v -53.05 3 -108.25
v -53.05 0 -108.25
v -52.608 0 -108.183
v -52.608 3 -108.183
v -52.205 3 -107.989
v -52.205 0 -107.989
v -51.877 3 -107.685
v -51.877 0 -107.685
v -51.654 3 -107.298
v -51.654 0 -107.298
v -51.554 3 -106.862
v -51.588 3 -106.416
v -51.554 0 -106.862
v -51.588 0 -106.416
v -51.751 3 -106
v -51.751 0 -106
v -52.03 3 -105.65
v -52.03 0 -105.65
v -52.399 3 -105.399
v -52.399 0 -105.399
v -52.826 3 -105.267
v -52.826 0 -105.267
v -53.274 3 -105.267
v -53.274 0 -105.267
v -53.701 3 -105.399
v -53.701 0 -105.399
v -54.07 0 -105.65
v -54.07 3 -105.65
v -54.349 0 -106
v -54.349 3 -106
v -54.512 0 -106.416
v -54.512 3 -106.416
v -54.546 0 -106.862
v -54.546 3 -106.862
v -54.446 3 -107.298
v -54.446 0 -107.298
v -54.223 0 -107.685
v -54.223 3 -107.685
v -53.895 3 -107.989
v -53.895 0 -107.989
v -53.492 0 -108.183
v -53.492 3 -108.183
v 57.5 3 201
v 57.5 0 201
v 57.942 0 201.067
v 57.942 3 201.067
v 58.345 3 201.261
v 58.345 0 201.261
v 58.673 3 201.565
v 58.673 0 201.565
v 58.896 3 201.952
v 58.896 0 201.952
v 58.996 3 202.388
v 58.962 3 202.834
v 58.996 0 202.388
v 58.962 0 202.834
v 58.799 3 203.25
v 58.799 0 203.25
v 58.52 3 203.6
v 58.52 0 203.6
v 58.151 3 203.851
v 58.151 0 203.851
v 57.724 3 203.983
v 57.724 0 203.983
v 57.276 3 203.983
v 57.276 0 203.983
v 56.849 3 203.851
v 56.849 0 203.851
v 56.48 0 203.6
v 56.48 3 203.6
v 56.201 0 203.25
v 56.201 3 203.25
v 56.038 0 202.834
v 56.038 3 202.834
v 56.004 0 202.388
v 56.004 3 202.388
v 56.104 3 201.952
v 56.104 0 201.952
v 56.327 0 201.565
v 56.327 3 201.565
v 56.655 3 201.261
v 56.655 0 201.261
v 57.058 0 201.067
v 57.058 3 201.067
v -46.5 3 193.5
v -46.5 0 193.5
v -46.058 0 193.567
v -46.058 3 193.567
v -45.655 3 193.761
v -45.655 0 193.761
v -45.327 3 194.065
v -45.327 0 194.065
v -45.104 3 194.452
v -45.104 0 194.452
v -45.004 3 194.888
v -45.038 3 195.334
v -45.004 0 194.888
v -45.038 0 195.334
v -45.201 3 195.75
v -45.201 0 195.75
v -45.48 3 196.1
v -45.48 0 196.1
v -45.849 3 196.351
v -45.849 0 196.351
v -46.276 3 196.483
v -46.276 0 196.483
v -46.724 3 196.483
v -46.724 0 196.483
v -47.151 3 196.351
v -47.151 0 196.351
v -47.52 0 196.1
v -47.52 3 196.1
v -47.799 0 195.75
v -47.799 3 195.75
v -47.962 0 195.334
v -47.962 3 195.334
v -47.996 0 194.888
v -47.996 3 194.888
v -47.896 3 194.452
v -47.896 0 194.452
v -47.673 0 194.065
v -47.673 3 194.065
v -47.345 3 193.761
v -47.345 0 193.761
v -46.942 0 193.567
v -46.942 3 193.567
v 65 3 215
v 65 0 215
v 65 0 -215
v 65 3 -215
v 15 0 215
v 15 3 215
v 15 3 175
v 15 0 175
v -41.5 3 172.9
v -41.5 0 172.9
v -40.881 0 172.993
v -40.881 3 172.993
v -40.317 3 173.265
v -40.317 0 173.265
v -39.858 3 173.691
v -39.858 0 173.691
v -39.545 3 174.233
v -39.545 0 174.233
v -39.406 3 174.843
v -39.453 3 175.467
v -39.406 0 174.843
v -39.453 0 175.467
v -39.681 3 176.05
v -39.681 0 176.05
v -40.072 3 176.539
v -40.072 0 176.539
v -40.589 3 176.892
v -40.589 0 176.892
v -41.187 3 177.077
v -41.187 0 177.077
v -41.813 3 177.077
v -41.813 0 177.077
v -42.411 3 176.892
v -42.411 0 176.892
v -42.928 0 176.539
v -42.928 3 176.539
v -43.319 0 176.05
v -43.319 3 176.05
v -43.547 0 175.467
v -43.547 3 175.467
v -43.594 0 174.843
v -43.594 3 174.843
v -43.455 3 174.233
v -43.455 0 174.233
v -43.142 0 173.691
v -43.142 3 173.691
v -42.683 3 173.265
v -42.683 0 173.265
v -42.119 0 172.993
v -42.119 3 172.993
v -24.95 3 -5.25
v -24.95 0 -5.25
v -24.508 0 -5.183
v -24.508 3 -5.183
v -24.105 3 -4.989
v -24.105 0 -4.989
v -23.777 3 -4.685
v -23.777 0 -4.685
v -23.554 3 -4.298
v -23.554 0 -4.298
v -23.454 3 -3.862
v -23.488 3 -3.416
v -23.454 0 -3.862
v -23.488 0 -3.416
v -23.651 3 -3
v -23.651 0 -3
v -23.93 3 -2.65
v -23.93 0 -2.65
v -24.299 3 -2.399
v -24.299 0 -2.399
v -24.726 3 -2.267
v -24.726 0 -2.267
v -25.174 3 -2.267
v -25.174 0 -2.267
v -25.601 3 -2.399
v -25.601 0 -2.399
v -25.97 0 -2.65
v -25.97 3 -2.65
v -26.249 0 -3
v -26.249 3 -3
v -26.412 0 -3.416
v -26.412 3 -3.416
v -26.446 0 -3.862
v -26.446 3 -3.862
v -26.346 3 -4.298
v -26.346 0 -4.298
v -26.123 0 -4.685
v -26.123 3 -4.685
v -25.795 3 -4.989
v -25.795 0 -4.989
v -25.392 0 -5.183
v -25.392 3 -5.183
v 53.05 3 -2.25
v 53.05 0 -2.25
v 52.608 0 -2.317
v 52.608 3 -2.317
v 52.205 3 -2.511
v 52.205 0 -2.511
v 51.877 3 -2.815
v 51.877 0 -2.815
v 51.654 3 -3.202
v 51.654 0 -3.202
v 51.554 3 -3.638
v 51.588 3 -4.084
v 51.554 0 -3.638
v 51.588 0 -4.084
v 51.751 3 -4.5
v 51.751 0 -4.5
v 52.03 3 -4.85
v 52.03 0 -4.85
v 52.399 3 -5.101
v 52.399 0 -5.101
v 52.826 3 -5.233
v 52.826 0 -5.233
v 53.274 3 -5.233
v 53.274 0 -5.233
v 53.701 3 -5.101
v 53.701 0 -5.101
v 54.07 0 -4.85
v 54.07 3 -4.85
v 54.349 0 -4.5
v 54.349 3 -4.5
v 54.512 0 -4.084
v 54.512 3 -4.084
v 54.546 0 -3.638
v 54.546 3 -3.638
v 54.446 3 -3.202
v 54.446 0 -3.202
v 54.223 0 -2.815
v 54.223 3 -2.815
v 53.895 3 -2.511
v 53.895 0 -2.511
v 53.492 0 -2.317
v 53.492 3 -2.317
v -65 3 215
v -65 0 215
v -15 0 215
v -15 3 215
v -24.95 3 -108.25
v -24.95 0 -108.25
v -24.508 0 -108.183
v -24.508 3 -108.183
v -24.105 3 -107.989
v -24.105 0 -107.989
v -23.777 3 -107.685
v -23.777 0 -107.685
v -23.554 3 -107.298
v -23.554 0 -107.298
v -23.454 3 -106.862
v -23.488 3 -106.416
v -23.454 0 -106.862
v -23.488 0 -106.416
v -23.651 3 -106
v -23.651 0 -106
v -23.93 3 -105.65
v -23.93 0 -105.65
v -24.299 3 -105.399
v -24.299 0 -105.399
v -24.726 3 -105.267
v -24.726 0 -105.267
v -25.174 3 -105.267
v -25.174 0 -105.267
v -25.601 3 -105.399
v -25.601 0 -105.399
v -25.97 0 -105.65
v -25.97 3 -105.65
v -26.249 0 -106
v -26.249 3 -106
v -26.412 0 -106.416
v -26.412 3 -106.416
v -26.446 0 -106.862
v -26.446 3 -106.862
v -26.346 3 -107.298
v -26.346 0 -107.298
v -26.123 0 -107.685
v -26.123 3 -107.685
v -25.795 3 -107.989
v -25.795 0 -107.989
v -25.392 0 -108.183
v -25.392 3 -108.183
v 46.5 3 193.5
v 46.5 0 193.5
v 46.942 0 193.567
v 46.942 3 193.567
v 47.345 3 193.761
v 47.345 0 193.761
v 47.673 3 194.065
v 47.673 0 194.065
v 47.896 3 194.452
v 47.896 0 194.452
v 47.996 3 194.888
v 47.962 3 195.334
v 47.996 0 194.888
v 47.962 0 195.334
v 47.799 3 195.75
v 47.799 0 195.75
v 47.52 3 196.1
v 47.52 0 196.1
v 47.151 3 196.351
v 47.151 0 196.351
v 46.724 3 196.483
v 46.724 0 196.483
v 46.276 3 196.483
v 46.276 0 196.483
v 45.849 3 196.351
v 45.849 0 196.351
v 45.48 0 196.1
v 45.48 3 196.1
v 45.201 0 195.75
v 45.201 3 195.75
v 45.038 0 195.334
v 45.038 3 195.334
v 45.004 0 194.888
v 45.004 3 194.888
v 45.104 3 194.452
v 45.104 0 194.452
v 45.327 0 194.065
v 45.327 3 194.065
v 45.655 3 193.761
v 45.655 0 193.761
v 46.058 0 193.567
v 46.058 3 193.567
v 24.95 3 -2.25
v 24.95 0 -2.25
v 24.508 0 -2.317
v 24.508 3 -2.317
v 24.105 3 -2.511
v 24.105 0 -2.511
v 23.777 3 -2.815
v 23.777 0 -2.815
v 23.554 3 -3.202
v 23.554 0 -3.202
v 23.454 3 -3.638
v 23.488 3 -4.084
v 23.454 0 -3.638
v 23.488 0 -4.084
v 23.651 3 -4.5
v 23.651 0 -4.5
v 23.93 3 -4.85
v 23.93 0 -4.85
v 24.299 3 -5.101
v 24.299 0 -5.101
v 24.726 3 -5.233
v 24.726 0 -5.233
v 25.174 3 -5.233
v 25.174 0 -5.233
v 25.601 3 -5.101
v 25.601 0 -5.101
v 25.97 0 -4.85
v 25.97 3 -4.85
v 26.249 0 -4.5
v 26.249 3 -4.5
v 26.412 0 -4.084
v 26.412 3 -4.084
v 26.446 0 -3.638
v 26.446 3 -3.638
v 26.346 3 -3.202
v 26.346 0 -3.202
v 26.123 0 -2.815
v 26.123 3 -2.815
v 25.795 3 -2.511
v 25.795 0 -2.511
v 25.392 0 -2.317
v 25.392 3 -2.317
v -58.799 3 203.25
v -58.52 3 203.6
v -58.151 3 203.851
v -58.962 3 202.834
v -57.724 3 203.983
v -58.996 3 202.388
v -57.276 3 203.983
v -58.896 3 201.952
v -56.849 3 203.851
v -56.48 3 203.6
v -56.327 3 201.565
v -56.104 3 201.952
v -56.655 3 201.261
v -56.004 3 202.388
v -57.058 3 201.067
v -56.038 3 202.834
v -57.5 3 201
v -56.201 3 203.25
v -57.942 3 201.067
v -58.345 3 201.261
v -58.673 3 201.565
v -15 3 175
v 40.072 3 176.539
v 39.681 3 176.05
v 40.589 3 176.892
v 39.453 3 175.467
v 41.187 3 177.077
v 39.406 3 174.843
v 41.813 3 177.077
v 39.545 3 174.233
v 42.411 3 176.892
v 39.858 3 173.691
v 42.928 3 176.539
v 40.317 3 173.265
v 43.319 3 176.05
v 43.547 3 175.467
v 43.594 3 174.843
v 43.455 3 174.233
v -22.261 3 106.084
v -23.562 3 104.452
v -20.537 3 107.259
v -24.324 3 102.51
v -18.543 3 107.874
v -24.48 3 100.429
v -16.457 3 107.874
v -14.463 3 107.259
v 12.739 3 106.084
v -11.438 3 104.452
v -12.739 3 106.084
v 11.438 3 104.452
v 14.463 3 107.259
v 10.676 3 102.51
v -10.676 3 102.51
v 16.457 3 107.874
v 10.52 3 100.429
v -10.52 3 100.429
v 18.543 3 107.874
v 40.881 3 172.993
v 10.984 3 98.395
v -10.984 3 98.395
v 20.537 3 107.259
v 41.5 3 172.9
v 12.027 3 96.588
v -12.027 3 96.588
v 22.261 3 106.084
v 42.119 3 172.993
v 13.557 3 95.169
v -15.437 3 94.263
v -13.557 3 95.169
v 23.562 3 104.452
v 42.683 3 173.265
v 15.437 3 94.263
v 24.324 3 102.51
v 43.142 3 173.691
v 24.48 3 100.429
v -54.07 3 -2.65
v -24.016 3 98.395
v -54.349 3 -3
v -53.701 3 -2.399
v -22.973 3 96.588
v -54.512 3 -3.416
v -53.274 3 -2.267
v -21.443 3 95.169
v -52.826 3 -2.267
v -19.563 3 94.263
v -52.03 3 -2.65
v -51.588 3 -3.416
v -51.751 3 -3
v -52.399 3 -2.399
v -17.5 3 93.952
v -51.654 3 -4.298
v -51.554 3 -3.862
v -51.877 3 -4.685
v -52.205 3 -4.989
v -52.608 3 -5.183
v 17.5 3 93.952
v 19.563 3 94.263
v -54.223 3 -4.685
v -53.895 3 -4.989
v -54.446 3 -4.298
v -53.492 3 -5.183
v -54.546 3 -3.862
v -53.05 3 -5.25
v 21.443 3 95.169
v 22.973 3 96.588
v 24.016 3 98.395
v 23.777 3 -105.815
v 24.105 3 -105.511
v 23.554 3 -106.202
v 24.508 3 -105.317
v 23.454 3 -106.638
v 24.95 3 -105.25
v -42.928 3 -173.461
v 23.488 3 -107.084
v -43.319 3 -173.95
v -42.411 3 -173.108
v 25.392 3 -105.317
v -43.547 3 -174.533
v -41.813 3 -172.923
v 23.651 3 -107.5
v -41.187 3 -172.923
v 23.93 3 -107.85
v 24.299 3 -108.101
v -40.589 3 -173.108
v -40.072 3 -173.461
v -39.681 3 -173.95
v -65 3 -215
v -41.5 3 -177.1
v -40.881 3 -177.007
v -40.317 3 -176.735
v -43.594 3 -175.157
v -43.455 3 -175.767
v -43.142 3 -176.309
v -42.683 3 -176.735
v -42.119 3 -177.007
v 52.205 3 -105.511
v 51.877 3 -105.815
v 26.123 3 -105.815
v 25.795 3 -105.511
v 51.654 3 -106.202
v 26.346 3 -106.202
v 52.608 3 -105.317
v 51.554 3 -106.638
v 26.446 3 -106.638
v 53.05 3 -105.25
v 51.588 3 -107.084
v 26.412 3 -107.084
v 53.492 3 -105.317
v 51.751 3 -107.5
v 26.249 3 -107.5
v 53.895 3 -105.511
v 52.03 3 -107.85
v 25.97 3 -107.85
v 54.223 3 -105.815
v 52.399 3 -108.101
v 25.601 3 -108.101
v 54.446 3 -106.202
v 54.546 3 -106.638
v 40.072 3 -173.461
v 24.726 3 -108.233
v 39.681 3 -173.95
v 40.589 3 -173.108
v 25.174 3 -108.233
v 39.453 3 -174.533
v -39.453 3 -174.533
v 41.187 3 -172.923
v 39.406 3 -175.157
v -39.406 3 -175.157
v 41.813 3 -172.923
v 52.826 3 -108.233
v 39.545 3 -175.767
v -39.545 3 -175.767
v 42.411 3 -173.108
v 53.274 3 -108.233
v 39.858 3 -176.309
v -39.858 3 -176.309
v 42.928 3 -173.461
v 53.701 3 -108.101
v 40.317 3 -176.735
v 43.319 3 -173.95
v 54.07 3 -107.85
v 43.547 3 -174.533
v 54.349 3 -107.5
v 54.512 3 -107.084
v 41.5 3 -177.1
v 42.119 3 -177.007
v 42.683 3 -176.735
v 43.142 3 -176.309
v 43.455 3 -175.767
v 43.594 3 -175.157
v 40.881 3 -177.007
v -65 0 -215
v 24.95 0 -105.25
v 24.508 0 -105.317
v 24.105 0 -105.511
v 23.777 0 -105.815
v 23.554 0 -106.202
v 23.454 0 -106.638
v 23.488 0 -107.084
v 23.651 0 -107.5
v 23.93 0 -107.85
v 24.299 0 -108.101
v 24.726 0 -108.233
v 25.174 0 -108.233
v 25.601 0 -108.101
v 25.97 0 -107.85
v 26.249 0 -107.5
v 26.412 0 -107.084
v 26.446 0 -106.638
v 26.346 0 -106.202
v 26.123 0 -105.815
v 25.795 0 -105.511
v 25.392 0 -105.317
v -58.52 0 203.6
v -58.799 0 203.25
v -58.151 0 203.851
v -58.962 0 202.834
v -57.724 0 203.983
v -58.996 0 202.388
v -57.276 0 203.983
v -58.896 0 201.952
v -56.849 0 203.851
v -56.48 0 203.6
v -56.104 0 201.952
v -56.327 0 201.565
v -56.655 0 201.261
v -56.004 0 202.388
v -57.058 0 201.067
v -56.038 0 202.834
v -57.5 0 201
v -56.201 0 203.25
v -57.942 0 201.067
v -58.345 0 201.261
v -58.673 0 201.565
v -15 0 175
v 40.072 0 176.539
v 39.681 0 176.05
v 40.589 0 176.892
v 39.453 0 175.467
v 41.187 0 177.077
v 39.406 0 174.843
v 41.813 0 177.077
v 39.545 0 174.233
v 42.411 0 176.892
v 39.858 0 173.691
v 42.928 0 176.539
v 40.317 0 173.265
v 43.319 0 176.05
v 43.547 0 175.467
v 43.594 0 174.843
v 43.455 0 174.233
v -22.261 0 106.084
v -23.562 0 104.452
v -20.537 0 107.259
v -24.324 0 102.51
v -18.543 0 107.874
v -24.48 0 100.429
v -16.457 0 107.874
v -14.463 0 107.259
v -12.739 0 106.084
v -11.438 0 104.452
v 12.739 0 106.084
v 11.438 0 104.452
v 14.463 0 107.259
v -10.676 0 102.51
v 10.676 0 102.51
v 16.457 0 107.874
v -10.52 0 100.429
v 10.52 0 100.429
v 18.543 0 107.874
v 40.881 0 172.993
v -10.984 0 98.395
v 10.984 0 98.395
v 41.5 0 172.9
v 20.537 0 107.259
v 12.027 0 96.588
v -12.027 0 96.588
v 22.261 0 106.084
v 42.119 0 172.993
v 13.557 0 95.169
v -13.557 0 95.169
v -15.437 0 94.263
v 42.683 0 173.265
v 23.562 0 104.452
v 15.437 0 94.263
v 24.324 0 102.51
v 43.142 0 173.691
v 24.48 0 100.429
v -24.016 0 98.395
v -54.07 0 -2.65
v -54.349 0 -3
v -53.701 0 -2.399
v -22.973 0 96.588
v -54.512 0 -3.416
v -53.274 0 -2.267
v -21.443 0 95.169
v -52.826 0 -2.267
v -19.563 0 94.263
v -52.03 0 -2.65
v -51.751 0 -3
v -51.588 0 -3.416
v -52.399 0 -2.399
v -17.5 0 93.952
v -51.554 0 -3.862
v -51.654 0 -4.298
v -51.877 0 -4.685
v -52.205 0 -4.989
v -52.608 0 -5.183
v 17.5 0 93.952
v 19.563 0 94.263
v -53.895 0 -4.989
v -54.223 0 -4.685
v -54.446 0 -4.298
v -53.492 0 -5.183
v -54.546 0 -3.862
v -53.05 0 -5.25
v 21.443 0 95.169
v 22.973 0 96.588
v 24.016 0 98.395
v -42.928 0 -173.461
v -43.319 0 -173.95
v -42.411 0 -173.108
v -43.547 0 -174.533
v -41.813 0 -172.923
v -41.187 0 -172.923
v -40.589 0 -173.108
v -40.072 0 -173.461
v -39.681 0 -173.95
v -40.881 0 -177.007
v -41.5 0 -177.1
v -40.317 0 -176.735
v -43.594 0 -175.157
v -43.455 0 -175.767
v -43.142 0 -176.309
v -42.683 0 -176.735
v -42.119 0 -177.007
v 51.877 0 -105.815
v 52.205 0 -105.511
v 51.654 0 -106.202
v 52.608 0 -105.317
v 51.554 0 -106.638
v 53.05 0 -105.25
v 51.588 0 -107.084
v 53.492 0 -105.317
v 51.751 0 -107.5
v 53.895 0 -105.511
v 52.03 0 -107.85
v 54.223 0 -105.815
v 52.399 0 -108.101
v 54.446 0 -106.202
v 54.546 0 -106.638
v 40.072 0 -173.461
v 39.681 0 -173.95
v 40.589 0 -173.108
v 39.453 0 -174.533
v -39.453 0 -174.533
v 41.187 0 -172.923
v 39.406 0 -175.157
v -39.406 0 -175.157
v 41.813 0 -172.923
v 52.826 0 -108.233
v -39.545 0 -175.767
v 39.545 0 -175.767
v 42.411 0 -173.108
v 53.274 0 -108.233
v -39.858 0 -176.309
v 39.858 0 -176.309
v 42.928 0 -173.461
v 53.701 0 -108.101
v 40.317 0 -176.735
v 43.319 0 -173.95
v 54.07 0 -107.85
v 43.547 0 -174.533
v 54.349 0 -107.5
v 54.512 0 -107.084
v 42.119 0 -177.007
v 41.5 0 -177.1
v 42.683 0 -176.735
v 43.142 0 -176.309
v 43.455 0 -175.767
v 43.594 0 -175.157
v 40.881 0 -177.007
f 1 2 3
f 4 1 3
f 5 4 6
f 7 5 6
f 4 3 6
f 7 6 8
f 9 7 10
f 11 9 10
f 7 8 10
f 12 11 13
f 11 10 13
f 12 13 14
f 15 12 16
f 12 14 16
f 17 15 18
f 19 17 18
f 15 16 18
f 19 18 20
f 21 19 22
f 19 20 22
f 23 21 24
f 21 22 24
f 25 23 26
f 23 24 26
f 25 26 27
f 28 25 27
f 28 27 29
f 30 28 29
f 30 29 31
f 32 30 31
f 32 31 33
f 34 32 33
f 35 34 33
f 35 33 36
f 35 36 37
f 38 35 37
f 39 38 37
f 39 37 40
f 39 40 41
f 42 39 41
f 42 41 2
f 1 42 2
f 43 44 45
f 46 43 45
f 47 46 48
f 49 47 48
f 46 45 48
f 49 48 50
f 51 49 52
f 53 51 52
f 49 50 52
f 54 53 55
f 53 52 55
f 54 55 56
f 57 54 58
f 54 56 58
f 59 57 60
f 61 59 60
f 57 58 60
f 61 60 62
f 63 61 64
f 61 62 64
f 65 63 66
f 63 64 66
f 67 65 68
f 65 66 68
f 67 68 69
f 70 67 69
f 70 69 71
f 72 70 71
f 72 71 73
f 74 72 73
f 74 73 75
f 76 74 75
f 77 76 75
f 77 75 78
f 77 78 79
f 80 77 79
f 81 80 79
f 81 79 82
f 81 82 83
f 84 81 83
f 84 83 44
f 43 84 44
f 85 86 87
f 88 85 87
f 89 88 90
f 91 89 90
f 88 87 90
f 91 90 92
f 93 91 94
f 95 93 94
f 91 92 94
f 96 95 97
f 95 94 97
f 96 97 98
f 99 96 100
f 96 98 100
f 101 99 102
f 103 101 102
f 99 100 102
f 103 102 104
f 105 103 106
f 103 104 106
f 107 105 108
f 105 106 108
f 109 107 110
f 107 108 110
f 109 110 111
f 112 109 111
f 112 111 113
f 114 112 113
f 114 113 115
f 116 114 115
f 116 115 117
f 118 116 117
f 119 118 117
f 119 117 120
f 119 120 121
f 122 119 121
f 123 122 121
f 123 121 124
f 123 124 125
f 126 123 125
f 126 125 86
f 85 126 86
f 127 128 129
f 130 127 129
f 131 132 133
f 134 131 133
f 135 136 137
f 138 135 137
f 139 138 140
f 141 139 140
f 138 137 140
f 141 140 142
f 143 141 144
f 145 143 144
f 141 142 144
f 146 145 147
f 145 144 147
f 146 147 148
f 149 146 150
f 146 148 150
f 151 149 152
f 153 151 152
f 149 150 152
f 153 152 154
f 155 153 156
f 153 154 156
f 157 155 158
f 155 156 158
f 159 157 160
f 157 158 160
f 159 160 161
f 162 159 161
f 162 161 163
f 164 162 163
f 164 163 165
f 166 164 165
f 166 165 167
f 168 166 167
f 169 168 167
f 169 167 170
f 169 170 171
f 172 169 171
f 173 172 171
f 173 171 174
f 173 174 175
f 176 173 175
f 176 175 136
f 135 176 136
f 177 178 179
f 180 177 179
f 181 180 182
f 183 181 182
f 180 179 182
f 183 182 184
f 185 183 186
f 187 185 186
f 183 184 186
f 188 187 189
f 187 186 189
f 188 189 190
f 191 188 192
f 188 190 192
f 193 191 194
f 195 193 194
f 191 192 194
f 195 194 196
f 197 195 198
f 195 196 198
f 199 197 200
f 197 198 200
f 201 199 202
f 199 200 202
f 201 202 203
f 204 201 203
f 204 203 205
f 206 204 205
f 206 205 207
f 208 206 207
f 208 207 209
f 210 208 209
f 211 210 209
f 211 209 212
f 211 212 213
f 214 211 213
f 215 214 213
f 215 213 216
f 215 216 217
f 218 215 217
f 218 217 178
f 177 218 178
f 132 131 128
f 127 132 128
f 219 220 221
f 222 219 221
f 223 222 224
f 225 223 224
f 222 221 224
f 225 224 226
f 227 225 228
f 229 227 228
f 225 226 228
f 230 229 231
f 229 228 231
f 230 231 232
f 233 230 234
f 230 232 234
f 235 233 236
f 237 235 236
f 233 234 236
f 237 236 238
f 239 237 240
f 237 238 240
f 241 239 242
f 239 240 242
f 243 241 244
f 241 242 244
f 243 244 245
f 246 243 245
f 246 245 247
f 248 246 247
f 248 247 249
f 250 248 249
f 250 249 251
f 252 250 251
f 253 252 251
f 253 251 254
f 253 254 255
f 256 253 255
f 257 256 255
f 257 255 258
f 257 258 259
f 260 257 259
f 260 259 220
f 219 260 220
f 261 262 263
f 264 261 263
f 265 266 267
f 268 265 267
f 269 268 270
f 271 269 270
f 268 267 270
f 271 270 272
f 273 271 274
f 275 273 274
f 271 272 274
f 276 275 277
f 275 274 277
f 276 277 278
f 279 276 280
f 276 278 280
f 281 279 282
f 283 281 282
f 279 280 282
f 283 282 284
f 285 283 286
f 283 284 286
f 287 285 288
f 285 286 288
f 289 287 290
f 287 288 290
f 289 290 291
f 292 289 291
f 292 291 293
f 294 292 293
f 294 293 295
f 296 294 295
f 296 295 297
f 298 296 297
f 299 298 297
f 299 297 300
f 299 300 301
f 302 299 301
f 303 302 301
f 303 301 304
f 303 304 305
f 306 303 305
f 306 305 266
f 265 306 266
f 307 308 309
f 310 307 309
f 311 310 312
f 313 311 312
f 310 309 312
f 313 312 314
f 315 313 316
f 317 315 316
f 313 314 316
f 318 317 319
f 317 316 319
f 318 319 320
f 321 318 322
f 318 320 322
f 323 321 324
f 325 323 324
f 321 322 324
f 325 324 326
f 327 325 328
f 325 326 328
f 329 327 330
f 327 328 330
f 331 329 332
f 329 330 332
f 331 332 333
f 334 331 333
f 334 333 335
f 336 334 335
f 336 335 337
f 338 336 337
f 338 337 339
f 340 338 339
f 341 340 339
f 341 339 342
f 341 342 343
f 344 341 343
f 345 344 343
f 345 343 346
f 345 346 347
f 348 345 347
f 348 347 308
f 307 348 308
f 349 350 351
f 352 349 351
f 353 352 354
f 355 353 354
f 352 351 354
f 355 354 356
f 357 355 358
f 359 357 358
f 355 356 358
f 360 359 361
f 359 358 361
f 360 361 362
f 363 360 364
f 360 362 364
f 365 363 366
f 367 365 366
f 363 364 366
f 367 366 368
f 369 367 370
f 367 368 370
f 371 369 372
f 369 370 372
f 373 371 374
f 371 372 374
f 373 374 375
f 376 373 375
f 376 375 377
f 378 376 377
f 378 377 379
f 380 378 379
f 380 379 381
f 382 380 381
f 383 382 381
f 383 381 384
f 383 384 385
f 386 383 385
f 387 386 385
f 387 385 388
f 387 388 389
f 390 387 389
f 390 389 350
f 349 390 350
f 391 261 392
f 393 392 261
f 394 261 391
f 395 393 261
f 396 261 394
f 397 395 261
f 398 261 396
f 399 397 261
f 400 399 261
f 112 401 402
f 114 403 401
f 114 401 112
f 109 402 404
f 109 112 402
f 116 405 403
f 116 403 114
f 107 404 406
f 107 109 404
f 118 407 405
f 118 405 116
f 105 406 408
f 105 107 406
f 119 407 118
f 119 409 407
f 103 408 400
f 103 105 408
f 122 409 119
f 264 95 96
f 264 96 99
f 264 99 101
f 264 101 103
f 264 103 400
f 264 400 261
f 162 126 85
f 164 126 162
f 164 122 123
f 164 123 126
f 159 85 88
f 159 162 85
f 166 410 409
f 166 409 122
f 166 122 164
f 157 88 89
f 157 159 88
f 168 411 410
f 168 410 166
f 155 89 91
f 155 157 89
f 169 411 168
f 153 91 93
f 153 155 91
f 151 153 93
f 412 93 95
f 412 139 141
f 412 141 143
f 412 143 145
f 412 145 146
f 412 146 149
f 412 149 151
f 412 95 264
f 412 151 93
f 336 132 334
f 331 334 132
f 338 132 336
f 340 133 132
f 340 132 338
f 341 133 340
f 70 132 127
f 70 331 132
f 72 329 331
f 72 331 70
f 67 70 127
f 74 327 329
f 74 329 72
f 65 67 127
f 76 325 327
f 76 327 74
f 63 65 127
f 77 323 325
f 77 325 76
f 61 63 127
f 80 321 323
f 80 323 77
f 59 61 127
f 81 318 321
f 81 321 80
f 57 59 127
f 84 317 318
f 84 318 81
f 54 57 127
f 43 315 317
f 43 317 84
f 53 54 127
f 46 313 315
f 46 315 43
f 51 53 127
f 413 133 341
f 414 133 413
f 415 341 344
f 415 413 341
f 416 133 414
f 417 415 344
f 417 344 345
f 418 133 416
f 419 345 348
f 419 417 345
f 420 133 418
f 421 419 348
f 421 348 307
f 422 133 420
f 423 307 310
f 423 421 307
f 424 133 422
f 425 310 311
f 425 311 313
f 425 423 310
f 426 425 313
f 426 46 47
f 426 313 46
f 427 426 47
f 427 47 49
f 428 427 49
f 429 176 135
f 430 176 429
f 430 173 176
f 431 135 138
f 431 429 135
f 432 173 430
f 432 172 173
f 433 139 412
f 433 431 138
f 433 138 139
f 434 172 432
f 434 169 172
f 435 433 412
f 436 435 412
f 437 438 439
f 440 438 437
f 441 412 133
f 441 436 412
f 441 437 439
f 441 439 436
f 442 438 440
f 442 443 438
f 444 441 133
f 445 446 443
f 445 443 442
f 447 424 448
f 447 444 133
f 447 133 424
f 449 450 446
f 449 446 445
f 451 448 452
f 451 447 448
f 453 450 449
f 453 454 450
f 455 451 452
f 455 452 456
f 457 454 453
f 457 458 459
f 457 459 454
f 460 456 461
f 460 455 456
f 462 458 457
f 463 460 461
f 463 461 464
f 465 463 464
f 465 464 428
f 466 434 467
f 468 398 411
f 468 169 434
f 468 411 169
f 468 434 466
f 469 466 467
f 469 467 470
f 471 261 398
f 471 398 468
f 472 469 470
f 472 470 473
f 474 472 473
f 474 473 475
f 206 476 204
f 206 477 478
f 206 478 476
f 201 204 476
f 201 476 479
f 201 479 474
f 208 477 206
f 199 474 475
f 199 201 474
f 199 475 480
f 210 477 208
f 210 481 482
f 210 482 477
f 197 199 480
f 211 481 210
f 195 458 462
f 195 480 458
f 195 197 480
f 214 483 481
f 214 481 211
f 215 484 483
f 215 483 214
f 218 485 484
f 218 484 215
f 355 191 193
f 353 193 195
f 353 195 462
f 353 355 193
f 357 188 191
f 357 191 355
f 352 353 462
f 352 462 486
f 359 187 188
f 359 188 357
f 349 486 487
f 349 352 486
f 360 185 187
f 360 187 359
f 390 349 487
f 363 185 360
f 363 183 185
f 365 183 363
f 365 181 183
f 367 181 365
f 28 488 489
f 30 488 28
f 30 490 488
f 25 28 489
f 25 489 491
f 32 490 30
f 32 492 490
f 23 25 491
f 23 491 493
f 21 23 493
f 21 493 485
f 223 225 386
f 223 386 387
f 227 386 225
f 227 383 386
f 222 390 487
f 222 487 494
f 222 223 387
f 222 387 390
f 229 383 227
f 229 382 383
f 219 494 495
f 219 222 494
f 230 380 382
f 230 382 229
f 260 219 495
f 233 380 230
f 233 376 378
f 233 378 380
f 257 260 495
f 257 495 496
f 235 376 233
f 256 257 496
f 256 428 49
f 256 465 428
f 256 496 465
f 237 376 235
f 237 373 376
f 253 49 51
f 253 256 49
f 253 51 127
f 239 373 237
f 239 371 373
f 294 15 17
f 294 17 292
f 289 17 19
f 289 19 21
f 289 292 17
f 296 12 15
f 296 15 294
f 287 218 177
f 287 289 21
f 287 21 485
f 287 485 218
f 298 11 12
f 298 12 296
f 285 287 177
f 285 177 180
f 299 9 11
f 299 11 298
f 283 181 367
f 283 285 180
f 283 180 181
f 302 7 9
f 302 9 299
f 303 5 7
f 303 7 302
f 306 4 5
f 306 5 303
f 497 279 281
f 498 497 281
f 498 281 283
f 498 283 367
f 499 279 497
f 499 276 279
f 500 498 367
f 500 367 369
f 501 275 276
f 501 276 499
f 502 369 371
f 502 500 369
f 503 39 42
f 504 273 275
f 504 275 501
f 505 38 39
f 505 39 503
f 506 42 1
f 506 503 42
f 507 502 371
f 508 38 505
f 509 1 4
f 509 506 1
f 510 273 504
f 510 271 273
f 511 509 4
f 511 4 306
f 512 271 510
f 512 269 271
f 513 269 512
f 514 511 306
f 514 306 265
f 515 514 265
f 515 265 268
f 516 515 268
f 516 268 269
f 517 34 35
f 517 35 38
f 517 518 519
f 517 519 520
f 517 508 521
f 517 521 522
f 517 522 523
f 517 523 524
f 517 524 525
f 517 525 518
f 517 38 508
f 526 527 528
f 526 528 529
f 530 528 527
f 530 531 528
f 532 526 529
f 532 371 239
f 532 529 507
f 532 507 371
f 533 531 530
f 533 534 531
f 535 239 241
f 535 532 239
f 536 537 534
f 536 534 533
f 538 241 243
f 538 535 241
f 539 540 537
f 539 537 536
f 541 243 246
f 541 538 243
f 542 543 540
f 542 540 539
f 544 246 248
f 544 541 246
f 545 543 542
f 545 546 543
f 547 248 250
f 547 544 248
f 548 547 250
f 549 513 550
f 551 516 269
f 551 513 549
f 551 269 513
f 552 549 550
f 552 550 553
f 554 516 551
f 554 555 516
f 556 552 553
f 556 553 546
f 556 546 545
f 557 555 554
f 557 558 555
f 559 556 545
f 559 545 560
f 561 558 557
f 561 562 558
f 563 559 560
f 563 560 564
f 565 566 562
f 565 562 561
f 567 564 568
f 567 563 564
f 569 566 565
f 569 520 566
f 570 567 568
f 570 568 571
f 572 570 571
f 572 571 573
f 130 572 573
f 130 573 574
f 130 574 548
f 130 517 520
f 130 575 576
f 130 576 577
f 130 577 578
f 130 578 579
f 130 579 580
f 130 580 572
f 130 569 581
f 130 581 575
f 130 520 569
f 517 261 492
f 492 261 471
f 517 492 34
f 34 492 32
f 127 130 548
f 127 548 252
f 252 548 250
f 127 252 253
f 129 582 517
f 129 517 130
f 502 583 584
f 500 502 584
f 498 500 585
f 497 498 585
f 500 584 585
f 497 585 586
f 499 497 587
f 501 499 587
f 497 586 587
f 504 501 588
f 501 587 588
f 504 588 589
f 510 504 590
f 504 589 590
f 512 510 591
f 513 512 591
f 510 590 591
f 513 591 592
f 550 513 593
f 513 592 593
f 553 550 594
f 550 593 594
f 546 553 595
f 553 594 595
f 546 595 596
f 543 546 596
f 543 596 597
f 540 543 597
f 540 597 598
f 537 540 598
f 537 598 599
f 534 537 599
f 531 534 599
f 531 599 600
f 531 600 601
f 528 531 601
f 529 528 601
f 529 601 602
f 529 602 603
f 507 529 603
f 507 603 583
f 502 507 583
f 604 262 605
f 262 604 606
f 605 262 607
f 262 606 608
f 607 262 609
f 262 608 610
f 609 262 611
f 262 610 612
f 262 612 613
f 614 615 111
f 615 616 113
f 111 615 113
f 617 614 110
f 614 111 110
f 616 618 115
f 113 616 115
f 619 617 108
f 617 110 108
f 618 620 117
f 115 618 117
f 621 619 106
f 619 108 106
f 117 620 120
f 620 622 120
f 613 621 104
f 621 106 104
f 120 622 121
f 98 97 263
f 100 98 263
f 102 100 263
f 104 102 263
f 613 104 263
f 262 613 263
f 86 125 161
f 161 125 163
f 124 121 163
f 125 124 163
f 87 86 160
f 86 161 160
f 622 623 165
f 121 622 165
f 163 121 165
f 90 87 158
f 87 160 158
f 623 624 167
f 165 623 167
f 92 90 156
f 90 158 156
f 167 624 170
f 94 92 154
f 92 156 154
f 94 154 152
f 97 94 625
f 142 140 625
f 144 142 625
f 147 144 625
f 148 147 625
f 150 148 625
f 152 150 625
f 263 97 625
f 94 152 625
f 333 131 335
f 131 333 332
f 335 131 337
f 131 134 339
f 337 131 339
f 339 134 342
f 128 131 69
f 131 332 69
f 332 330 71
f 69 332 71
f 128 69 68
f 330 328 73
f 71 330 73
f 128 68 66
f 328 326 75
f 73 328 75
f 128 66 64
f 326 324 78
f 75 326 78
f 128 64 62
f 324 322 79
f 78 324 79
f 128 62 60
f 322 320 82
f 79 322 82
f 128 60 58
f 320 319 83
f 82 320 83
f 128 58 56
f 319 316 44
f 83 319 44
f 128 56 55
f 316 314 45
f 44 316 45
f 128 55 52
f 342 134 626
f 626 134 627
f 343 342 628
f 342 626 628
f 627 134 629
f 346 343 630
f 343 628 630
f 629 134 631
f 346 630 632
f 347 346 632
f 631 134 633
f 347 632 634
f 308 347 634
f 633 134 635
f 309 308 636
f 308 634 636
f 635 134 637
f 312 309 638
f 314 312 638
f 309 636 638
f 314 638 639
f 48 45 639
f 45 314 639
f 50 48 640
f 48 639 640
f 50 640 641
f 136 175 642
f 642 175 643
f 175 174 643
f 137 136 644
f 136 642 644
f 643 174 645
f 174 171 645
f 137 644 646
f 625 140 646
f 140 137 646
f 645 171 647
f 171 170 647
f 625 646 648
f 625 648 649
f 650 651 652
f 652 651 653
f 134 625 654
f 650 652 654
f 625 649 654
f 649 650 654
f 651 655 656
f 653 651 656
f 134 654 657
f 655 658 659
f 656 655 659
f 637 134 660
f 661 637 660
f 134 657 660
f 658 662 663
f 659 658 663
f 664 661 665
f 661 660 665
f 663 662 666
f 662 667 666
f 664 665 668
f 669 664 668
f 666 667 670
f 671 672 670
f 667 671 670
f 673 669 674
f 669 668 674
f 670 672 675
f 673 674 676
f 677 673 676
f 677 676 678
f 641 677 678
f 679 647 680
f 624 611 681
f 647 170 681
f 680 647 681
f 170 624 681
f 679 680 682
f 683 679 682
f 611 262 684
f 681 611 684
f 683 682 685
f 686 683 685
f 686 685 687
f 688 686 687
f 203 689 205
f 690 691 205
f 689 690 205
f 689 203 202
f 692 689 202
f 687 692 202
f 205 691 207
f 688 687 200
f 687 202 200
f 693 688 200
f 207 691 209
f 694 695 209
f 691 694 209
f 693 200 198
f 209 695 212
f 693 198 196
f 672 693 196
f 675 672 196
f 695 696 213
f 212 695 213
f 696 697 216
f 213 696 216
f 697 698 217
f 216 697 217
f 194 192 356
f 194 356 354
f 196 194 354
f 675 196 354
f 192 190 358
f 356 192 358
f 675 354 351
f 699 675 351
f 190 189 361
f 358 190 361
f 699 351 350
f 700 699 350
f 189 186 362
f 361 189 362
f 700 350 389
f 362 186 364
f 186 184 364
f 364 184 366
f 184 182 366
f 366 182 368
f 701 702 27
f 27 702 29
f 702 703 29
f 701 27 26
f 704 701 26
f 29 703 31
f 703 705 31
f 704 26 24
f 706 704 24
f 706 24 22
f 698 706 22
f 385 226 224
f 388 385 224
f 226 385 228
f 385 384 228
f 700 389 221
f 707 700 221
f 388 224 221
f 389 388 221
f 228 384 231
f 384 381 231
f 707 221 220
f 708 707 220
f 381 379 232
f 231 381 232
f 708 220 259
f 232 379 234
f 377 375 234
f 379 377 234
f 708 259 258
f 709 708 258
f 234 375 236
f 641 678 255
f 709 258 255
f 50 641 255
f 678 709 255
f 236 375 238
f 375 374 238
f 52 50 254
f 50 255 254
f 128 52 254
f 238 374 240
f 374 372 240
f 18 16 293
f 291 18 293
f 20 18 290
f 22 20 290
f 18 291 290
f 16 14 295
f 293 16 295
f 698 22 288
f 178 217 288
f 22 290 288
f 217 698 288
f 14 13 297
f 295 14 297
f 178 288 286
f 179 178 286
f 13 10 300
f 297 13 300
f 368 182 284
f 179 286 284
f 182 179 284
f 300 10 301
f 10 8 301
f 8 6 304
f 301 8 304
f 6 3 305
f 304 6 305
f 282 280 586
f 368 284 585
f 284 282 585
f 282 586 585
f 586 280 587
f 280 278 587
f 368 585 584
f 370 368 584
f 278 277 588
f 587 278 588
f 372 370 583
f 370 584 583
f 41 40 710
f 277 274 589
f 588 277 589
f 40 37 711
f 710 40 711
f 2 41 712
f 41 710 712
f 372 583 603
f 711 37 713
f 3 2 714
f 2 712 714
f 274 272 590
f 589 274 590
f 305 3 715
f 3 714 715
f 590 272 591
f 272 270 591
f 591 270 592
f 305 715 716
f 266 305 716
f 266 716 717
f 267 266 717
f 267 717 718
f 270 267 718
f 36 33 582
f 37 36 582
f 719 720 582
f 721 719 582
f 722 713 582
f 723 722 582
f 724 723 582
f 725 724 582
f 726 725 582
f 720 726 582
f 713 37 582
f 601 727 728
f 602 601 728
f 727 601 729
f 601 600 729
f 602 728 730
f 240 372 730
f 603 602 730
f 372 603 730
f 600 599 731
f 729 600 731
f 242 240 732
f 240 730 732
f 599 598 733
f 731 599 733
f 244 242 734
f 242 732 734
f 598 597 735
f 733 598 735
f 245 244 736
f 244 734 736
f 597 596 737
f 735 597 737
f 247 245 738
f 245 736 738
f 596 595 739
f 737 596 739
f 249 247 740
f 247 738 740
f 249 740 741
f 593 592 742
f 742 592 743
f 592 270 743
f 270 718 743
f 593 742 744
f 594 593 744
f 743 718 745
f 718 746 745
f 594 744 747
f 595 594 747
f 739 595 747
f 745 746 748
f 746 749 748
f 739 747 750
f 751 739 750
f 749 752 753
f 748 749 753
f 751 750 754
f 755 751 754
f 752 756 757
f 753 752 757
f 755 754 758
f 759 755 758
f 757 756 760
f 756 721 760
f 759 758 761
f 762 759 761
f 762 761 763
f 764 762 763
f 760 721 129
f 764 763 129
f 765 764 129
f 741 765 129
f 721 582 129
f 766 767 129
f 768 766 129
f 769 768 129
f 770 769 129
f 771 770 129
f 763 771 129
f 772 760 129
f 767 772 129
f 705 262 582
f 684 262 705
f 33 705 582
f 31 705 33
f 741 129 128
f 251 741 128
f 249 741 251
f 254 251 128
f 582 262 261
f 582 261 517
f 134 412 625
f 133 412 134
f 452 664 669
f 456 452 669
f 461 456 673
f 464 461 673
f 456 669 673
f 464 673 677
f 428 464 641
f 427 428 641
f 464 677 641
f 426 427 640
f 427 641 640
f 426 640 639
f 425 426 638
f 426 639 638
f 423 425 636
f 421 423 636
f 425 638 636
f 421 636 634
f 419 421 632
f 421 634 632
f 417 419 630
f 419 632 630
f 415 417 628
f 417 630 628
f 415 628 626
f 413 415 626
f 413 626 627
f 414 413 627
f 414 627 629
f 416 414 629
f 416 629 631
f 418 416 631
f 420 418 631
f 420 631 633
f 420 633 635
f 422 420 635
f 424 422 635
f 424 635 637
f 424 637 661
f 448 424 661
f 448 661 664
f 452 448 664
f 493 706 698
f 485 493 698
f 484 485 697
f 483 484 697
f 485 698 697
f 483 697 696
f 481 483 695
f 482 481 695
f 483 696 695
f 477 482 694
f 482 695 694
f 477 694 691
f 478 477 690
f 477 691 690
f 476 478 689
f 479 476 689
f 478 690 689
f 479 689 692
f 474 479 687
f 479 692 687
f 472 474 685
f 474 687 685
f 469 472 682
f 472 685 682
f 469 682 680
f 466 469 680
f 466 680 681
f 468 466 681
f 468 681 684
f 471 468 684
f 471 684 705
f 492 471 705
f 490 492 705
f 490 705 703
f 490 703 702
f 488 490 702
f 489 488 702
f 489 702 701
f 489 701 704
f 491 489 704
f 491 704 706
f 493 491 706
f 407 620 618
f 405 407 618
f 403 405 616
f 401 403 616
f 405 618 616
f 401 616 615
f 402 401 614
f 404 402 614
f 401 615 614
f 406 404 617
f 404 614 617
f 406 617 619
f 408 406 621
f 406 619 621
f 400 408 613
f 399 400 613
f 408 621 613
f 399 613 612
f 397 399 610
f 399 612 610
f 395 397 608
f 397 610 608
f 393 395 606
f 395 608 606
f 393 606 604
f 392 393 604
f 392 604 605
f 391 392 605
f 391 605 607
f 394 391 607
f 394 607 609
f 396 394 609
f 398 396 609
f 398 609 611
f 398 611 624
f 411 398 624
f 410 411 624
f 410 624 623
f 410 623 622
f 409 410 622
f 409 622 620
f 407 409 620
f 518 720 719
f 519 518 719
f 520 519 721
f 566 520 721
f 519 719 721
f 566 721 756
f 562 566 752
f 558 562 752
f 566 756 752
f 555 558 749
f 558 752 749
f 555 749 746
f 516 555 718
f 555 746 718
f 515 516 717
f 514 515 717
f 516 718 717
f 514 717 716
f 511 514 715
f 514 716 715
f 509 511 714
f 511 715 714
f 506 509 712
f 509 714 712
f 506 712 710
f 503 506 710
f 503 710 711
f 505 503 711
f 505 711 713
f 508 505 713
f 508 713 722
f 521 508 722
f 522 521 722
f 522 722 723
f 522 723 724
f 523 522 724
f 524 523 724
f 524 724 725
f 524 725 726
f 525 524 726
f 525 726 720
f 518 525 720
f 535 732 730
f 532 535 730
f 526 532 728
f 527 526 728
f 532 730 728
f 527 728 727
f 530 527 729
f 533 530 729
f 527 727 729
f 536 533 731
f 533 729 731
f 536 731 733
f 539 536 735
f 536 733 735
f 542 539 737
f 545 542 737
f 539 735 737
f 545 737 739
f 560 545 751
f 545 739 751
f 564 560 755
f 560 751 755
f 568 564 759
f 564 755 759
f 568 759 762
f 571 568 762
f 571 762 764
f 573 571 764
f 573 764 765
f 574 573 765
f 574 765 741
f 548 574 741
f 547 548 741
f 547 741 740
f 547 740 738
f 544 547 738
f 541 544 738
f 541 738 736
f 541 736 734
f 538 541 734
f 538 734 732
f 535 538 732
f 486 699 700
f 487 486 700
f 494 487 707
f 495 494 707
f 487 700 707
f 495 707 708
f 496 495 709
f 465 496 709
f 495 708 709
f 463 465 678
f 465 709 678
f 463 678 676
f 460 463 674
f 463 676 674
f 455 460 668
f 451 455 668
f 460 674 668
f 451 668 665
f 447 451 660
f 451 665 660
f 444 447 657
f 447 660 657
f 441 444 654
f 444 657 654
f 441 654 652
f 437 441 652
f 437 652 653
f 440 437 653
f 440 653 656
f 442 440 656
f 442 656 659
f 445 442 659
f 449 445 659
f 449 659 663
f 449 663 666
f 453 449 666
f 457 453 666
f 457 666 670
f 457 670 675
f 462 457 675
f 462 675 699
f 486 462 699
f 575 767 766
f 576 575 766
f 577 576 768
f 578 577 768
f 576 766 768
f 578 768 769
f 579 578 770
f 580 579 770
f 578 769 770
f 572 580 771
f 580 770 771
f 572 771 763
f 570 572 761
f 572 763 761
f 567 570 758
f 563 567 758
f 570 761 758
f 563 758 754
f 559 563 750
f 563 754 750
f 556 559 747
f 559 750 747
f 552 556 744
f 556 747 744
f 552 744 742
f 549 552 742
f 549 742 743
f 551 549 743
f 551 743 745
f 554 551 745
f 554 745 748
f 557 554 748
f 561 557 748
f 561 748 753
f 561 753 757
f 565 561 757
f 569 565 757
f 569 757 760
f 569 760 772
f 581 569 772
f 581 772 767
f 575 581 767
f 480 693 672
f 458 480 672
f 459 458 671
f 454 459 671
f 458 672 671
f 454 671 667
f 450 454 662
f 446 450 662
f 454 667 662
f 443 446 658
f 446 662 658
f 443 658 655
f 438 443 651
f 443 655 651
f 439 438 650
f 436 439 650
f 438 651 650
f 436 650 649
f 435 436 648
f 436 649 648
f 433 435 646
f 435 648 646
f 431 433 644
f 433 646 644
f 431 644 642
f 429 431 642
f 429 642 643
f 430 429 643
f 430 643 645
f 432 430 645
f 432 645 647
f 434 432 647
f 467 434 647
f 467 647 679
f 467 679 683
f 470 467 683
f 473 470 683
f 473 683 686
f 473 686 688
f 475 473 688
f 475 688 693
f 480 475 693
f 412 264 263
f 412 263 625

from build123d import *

# Parameters (mm, degrees)
SKETCH1_W           = 130
SKETCH1_H           = 430
BOSS_EXTRUDE1_DEPTH = 3
SKETCH2_W           = 30
SKETCH2_H           = 40
CUT_EXTRUDE1_DEPTH  = 10
SKETCH3_R           = 1.5
SKETCH3_R_2         = 2.1
CUT_EXTRUDE2_DEPTH  = 10
SKETCH4_R           = 7
CUT_EXTRUDE3_DEPTH  = 10


with BuildPart() as part:
    # Sketch1 → Boss-Extrude1 (new body)
    with BuildSketch(Plane(origin=(0, 0, 0), x_dir=(1, 0, 0), z_dir=(0, 1, 0))):
        Rectangle(SKETCH1_W, SKETCH1_H)
    extrude(amount=BOSS_EXTRUDE1_DEPTH)

    # Sketch2 → Cut-Extrude1 (cut)
    with BuildSketch(Plane(origin=(0, 3, 0), x_dir=(1, 0, 0), z_dir=(0, 1, 0))):
        with Locations((0, -195)):
            Rectangle(SKETCH2_W, SKETCH2_H)
    extrude(amount=-CUT_EXTRUDE1_DEPTH, mode=Mode.SUBTRACT)

    # Sketch3 → Cut-Extrude2 (cut)
    with BuildSketch(Plane.XZ):
        with Locations(Location((-53.05, -3.75, 0), (0, 0, 270))):
            Circle(SKETCH3_R)
        with Locations(Location((-46.5, 195, 0), (0, 0, 270))):
            Circle(SKETCH3_R)
        with Locations(Location((-24.95, -3.75, 0), (0, 0, 270))):
            Circle(SKETCH3_R)
        with Locations(Location((-53.05, -106.75, 0), (0, 0, 270))):
            Circle(SKETCH3_R)
        with Locations(Location((46.5, 195, 0), (0, 0, 270))):
            Circle(SKETCH3_R)
        with Locations(Location((-24.95, -106.75, 0), (0, 0, 270))):
            Circle(SKETCH3_R)
        with Locations(Location((24.95, -106.75, 0), (0, 0, 90))):
            Circle(SKETCH3_R)
        with Locations(Location((57.5, 202.5, 0), (0, 0, 270))):
            Circle(SKETCH3_R)
        with Locations(Location((53.05, -106.75, 0), (0, 0, 90))):
            Circle(SKETCH3_R)
        with Locations(Location((24.95, -3.75, 0), (0, 0, 90))):
            Circle(SKETCH3_R)
        with Locations(Location((-57.5, 202.5, 0), (0, 0, 270))):
            Circle(SKETCH3_R)
        with Locations(Location((53.05, -3.75, 0), (0, 0, 90))):
            Circle(SKETCH3_R)
        with Locations(Location((-41.5, 175, 0), (0, 0, 270))):
            Circle(SKETCH3_R_2)
        with Locations(Location((41.5, 175, 0), (0, 0, 270))):
            Circle(SKETCH3_R_2)
        with Locations(Location((41.5, -175, 0), (0, 0, 270))):
            Circle(SKETCH3_R_2)
        with Locations(Location((-41.5, -175, 0), (0, 0, 270))):
            Circle(SKETCH3_R_2)
    extrude(amount=-CUT_EXTRUDE2_DEPTH, mode=Mode.SUBTRACT)

    # Sketch4 → Cut-Extrude3 (cut)
    with BuildSketch(Plane.XZ):
        with Locations(Location((-17.5, 100.952208061, 0), (0, 0, 270))):
            Circle(SKETCH4_R)
        with Locations(Location((17.5, 100.952208061, 0), (0, 0, 270))):
            Circle(SKETCH4_R)
    extrude(amount=-CUT_EXTRUDE3_DEPTH, mode=Mode.SUBTRACT)


solid = part.part
